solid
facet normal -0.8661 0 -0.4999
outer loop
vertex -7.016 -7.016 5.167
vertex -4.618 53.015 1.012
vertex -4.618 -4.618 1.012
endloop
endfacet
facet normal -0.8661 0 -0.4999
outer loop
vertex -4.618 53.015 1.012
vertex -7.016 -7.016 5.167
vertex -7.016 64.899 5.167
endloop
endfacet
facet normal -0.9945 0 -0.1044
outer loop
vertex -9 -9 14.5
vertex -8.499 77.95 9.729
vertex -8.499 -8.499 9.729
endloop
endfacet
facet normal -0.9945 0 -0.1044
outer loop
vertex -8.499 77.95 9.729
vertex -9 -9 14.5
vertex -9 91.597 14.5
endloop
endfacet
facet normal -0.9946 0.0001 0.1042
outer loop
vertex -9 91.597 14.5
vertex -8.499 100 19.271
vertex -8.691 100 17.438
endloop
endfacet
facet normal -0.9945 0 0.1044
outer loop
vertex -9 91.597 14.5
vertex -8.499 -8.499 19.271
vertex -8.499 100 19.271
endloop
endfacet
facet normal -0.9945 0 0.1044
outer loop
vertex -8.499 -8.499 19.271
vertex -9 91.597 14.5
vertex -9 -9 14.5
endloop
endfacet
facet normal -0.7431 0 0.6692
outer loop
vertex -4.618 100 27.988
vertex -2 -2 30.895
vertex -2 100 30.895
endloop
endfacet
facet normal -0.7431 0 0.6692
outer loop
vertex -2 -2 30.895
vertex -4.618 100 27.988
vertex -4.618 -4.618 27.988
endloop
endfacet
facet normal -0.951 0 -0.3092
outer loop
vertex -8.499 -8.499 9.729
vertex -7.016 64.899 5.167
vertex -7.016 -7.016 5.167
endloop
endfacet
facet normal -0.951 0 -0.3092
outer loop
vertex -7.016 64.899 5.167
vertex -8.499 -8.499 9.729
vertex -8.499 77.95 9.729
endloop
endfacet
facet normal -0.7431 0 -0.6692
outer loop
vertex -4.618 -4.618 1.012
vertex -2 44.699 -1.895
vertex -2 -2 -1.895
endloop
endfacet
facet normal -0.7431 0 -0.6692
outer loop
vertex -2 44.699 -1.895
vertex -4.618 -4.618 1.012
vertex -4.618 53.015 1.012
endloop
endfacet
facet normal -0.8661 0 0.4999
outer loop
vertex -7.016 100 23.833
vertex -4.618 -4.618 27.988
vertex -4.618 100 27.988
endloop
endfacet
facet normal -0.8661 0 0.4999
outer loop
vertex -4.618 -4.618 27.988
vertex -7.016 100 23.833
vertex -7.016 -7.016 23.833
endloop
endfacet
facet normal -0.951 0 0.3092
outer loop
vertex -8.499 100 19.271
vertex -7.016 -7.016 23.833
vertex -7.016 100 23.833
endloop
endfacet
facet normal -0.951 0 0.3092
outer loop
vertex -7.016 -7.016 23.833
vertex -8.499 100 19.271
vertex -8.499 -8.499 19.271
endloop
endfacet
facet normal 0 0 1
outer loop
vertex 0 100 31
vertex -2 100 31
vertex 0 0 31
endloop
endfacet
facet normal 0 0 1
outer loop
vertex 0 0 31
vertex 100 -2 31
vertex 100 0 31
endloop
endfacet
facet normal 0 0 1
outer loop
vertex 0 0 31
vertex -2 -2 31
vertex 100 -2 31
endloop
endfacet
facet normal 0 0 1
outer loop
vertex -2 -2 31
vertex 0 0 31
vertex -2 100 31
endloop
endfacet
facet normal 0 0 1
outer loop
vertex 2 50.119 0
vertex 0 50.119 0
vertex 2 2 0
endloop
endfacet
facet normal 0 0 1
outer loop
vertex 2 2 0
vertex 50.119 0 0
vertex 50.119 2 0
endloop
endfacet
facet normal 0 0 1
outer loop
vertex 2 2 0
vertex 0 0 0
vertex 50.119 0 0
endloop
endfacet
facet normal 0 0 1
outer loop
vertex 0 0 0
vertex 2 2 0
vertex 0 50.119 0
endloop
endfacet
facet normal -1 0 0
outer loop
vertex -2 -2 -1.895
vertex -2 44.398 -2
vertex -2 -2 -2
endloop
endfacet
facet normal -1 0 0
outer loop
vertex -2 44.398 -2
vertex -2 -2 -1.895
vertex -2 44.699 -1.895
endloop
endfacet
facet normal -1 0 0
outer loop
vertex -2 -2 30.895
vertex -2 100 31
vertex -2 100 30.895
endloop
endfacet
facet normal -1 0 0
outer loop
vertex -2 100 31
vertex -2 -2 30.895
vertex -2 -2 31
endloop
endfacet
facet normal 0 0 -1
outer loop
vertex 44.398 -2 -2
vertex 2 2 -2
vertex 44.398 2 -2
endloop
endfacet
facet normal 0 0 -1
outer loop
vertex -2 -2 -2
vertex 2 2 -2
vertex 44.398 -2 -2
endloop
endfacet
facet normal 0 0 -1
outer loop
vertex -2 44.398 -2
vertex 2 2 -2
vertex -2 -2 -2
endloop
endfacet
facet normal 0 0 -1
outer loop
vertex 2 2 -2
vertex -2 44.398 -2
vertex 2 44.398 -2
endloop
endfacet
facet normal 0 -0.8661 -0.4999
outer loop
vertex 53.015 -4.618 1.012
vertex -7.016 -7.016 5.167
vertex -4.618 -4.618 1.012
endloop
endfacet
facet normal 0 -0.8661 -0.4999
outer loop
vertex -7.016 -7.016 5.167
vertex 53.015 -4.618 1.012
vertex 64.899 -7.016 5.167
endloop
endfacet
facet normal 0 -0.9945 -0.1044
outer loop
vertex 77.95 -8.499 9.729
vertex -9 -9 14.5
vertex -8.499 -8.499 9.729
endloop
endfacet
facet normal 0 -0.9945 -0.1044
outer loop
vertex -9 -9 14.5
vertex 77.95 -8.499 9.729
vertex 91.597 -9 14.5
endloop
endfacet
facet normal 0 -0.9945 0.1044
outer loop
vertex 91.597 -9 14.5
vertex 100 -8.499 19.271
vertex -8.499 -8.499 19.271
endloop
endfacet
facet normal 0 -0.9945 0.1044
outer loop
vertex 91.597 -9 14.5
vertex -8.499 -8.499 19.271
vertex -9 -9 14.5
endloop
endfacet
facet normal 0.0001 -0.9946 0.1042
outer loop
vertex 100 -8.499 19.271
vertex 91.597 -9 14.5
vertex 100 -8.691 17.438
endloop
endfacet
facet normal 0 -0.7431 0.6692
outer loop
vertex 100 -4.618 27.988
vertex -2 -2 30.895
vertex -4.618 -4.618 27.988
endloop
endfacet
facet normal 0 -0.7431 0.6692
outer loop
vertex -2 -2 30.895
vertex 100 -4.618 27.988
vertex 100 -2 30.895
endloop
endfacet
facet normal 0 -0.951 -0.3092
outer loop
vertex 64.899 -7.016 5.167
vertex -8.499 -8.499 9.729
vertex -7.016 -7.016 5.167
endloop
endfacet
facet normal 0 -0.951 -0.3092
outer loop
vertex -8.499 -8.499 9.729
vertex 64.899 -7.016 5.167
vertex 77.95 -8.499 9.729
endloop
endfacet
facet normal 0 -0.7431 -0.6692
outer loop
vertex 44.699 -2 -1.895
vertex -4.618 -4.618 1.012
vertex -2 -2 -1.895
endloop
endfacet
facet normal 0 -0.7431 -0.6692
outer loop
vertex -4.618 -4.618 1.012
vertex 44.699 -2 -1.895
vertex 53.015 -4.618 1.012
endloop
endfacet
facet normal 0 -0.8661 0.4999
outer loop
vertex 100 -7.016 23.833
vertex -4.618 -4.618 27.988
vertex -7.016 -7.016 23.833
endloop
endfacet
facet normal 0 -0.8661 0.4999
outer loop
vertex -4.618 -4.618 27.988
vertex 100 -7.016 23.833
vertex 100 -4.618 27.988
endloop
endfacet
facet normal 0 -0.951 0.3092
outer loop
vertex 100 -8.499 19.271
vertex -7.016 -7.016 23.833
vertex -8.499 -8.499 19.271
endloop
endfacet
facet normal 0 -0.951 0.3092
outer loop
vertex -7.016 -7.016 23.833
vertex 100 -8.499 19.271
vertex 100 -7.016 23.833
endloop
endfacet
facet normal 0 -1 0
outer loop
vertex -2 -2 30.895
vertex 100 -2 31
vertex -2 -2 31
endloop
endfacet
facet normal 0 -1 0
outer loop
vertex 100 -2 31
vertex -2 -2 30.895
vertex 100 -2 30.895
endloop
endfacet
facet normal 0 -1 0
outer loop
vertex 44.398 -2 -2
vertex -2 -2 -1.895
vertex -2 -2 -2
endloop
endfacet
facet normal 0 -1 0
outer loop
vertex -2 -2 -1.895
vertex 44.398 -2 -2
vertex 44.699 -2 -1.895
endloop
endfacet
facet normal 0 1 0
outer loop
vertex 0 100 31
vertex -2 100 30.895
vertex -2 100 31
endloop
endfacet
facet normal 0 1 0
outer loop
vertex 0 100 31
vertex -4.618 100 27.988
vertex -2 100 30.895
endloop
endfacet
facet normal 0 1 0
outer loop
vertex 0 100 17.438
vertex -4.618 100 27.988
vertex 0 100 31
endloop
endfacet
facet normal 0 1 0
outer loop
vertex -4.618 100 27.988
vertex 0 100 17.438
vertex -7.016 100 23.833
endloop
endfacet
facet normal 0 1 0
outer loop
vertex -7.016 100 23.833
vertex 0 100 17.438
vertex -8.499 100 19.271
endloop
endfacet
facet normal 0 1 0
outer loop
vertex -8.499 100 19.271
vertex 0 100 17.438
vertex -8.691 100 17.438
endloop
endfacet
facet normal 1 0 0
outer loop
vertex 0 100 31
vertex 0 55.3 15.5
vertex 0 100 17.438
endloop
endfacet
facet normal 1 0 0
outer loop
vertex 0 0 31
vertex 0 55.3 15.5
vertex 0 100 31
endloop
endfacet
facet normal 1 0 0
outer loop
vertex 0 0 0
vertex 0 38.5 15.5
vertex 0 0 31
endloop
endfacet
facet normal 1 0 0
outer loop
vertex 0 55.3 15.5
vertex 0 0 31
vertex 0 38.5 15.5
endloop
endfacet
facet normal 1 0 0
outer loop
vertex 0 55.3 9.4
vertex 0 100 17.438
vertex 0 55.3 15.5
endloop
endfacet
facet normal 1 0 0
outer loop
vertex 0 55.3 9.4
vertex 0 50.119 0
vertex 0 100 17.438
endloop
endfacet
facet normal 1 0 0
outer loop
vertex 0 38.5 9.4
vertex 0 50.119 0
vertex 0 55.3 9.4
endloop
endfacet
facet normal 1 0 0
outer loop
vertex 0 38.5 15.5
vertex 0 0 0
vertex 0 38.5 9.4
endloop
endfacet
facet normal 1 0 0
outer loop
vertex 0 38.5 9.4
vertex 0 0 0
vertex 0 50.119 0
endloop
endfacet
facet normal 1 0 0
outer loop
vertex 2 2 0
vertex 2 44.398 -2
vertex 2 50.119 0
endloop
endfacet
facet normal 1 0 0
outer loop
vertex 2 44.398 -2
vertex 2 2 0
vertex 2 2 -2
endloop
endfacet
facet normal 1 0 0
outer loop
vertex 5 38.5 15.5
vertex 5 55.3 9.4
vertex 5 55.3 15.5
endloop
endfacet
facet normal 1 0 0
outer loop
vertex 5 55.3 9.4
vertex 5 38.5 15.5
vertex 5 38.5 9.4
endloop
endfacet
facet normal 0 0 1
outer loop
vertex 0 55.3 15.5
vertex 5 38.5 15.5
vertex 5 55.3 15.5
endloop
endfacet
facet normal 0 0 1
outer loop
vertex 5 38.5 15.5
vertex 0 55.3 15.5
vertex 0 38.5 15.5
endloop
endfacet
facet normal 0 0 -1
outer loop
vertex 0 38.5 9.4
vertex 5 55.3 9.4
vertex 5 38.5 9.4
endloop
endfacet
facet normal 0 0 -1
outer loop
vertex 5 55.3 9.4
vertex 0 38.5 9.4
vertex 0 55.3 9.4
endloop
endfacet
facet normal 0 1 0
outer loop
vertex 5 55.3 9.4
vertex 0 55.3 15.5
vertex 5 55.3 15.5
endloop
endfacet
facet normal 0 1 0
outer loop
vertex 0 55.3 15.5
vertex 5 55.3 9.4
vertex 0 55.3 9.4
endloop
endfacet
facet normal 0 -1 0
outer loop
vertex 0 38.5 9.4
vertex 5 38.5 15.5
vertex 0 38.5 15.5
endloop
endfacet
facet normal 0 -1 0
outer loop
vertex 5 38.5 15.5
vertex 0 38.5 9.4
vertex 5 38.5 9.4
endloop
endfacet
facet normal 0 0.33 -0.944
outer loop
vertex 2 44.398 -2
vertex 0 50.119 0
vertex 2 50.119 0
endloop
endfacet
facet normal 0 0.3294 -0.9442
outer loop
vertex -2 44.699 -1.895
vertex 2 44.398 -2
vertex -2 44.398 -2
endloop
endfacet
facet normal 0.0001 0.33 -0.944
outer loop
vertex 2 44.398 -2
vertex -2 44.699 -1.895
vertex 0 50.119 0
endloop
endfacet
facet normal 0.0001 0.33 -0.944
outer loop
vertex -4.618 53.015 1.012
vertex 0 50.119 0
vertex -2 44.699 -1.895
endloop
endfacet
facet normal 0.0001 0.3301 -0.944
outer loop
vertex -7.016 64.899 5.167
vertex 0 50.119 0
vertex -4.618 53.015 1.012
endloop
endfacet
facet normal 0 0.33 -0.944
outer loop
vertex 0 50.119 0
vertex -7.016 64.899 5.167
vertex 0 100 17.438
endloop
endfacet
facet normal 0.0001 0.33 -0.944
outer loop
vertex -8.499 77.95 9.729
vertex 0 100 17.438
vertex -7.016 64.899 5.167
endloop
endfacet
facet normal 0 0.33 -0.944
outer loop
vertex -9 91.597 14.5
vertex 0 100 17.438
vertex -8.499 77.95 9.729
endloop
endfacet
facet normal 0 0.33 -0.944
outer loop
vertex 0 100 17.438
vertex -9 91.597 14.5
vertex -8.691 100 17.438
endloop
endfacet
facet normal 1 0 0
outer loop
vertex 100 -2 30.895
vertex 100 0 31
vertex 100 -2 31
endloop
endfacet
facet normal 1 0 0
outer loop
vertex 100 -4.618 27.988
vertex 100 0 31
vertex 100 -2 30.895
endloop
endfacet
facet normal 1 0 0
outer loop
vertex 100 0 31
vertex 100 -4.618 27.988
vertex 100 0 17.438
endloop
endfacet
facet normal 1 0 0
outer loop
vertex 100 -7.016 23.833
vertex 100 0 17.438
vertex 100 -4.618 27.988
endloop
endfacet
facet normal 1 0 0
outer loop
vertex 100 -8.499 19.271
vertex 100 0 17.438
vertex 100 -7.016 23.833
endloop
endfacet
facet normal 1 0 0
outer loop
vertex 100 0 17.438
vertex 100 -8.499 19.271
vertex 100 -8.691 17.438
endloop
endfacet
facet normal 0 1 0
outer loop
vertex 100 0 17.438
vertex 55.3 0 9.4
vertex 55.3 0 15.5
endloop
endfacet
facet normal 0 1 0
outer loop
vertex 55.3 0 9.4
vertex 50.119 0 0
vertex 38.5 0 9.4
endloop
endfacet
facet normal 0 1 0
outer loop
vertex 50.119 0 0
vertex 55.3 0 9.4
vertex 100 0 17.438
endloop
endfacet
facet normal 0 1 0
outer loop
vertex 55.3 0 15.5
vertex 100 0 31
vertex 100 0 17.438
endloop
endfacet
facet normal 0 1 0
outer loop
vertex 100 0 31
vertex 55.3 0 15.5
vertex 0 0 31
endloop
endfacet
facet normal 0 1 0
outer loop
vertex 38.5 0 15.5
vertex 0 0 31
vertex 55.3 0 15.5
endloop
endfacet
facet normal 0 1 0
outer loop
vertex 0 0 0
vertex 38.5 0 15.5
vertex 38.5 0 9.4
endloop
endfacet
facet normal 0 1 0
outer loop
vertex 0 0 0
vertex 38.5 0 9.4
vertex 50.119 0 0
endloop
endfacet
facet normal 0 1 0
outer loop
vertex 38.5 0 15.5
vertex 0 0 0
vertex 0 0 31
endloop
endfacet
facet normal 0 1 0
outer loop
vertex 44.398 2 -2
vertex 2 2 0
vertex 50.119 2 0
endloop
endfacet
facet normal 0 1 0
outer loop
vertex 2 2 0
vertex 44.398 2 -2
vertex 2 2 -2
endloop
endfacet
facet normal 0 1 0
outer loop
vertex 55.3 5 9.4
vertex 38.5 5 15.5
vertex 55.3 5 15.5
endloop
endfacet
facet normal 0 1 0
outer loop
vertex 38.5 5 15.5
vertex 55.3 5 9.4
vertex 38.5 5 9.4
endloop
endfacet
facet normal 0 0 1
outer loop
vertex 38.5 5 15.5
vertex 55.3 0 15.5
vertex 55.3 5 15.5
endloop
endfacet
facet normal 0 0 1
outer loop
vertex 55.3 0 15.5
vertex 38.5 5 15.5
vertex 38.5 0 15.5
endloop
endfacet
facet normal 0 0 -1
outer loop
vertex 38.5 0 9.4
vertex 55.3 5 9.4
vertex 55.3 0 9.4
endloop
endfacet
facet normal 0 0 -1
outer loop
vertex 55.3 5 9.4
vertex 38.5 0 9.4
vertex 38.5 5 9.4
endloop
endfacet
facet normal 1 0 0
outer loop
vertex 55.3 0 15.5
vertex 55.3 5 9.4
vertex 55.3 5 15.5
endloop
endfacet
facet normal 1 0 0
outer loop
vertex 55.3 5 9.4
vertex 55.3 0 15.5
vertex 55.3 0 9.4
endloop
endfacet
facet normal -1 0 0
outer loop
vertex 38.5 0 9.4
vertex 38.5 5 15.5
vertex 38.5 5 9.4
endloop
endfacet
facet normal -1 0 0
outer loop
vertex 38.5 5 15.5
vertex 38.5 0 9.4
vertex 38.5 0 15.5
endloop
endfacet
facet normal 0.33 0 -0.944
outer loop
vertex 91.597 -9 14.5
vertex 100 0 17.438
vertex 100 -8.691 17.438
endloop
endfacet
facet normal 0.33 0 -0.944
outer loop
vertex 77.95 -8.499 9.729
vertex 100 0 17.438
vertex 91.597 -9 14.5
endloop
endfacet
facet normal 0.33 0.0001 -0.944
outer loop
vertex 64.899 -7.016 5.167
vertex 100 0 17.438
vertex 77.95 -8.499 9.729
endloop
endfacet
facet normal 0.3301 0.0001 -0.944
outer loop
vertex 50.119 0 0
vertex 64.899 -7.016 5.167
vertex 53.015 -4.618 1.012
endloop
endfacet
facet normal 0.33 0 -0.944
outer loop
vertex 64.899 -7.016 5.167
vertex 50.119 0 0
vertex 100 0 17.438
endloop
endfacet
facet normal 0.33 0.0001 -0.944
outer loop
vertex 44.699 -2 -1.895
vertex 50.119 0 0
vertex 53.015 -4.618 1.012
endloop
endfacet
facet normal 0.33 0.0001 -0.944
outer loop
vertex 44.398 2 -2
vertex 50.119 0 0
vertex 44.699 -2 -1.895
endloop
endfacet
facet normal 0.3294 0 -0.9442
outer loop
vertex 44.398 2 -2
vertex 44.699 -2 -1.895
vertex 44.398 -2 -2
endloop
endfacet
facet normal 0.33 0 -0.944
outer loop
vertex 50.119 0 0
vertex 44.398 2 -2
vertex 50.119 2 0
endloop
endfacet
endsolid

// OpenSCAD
hole_width = 16.8;
hole_height = 6.1;
hole_depth = 5;
distance_from_corner = 38.5;
distance_from_top = 15.5;
height = 31;
length = 100;
thickness1 = 7;
thickness2 = 2;
full_thickness = thickness1 + thickness2;
full_height = height + thickness2;
radius = thickness1 / 2 + full_height * full_height / 8 / thickness1;
angle = asin(full_height / length);

echo("radius = ", radius);
echo("angle = ", angle);

module side(side_length, ledge) {
    difference() {
        union() {
            translate([radius - full_thickness, side_length, height / 2 - thickness2 / 2]) {
                rotate([90, 0, 0]) {
                    difference() {
                        cylinder(r = radius, h = side_length);
                        translate([thickness1 - radius, -radius, 0]) cube(size = [2 * radius, 2 * radius, side_length]);
                    }
                }
            }
            translate([-thickness2, 0, 0]) cube(size = [thickness2, side_length, height]);
            translate([-thickness2, 0, -thickness2]) cube(size = [thickness2 * 2, side_length, thickness2]);
            if (ledge) {
                translate([0, distance_from_corner, height - distance_from_top - hole_height]) cube(size = [hole_depth, hole_width, hole_height]);
            }
        }
        translate([-full_thickness, length / 2, -full_height - thickness2]) rotate([angle, 0, 0]) cube(size = [full_thickness + thickness2, length, full_height]);
    }
}


module corner() {
    intersection() {
        translate([0, -full_thickness, 0]) side(length + full_thickness, false);
        translate([-full_thickness, 0, 0]) mirror([0, 1, 0]) rotate([0, 0, 270]) side(length + full_thickness, false);
    }
}

union() {
    corner();
    side(length, true);
    mirror([0, 1, 0]) rotate([0, 0, 270]) side(length, true);
}
